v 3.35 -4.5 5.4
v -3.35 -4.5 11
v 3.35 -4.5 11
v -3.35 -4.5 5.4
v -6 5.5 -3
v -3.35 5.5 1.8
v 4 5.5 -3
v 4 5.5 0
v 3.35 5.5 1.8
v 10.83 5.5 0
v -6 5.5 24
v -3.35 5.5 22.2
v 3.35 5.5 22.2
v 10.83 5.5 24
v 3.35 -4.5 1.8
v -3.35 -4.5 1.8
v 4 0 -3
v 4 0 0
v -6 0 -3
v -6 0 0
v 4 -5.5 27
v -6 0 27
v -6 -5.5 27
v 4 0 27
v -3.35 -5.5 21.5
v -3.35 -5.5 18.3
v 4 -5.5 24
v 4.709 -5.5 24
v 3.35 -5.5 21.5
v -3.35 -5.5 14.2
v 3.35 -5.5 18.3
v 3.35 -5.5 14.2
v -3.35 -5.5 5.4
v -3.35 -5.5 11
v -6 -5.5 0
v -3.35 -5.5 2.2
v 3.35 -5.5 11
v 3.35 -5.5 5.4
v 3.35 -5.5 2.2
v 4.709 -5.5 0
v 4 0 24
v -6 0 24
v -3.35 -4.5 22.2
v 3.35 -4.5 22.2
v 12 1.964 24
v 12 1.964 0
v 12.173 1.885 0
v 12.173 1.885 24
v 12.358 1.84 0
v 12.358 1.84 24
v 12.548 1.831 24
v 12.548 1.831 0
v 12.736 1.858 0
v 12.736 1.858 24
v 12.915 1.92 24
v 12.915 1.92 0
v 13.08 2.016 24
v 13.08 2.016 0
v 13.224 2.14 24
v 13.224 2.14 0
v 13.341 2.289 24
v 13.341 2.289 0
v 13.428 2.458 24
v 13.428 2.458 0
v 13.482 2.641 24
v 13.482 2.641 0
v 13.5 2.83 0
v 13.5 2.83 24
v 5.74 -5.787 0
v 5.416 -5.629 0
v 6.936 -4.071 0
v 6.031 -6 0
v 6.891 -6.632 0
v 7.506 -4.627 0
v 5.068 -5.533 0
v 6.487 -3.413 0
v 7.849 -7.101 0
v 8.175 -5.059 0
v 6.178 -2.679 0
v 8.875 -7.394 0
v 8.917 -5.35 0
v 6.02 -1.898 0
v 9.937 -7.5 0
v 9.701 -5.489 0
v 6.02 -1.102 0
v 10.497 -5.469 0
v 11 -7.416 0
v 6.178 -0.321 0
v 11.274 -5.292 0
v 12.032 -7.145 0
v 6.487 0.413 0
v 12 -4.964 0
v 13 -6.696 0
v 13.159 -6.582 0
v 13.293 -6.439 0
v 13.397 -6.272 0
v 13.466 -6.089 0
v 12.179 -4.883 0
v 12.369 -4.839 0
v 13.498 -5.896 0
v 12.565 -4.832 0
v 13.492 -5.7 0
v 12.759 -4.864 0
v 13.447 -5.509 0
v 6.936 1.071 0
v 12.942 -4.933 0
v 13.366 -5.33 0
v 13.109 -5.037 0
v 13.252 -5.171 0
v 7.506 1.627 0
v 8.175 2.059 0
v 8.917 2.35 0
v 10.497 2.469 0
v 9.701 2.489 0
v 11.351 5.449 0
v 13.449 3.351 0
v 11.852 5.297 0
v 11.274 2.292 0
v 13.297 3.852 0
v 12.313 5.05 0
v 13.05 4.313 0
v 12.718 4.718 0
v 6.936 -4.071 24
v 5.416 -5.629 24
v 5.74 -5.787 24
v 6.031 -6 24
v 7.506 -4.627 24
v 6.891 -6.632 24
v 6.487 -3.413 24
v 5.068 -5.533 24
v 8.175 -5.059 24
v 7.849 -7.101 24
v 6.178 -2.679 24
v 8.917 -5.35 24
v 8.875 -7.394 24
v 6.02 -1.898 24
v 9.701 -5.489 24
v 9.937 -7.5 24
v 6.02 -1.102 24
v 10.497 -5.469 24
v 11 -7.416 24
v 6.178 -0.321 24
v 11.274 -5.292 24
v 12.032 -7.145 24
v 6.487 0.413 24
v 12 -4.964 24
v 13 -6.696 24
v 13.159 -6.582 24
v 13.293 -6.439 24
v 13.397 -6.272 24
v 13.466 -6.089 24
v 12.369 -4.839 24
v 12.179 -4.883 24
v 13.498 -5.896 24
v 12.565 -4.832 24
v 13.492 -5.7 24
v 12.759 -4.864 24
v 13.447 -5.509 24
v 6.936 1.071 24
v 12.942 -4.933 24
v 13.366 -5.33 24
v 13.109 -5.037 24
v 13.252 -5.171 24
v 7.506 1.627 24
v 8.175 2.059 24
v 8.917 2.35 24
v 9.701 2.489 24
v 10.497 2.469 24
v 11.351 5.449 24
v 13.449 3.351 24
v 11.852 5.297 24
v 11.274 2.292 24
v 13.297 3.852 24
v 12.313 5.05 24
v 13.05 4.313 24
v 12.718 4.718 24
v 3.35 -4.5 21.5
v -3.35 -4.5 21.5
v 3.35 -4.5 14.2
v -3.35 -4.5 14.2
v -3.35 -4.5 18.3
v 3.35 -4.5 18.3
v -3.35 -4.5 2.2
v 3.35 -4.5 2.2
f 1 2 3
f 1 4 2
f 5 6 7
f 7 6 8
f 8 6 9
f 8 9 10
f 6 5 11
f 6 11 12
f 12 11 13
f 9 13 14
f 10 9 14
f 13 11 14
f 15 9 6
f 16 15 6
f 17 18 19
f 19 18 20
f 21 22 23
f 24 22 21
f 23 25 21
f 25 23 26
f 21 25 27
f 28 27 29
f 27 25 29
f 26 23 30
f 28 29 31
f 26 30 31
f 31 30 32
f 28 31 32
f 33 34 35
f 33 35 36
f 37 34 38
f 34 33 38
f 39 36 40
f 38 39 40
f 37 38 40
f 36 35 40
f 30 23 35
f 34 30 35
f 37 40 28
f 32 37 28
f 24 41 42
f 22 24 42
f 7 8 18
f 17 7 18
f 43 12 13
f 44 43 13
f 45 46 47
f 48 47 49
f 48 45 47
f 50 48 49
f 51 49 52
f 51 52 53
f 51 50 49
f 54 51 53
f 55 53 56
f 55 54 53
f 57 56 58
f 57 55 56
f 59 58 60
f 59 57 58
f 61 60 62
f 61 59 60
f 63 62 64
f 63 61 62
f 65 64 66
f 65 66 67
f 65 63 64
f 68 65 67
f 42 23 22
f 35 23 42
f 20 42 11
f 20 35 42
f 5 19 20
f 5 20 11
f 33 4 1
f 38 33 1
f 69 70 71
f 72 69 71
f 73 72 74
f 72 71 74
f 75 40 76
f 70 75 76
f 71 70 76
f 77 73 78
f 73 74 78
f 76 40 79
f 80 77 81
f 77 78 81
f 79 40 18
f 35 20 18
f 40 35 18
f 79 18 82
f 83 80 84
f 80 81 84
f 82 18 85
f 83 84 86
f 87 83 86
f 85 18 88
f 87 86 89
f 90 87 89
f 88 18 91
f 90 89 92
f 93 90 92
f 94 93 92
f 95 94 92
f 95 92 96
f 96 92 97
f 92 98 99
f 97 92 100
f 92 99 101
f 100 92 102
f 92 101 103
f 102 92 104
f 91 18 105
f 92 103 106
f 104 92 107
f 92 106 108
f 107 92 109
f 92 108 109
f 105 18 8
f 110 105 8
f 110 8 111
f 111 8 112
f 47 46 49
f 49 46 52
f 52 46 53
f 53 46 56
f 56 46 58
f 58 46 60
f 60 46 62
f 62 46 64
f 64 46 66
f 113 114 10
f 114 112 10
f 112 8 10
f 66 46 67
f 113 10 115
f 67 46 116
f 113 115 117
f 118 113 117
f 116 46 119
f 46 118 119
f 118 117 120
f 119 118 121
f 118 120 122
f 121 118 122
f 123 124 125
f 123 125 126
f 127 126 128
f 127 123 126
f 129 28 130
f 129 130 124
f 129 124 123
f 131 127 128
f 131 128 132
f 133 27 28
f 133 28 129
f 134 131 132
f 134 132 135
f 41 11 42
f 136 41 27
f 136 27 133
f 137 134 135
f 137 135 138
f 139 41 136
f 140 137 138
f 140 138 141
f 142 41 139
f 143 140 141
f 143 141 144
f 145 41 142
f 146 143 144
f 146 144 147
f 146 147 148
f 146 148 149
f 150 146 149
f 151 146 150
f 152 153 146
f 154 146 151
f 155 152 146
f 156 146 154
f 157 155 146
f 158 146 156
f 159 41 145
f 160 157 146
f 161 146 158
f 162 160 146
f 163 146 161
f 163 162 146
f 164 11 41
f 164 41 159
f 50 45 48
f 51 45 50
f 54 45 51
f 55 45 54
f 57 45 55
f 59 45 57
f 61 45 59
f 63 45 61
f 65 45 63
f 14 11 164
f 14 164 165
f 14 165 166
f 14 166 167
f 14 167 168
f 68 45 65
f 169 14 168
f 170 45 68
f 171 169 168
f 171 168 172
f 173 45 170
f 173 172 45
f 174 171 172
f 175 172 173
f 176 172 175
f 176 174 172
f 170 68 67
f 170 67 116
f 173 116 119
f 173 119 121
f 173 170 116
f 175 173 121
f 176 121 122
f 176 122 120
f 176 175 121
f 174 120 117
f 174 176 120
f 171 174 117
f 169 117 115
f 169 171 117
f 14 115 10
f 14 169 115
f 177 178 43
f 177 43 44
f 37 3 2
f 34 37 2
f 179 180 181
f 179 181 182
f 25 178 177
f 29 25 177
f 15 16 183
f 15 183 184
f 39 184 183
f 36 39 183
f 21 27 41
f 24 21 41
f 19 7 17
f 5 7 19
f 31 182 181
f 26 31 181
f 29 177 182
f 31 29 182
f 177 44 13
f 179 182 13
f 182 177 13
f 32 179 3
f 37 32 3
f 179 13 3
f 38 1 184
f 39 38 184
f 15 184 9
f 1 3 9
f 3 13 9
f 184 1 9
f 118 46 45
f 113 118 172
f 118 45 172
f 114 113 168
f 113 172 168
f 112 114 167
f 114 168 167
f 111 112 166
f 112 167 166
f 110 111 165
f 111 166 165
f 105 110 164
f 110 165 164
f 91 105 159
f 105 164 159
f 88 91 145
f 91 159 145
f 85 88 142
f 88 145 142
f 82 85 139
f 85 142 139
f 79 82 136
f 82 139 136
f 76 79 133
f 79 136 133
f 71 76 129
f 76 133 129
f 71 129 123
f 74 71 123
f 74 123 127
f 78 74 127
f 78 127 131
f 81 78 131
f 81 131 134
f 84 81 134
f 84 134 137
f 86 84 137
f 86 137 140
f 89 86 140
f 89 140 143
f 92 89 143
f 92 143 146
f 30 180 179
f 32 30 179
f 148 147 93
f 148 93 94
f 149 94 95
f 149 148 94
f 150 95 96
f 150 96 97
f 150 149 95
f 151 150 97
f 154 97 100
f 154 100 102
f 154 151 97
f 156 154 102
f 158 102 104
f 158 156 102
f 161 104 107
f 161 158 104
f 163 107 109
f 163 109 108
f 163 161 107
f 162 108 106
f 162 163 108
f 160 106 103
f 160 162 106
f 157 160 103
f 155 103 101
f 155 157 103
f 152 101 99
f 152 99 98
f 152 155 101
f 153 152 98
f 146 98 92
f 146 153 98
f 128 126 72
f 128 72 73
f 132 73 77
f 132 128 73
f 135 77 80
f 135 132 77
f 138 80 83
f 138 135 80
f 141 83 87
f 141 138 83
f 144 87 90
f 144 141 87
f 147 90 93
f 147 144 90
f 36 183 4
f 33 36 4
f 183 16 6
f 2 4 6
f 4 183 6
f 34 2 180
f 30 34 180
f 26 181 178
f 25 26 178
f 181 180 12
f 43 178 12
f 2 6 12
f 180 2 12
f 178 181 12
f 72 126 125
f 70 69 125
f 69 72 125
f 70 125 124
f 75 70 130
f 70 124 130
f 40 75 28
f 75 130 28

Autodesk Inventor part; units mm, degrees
ref_plane "YZ Plane" through (0, 0, 0) normal (1, 0, 0) x (0, 1, 0)
ref_plane "XZ Plane" through (0, 0, 0) normal (0, 1, 0) x (-1, 0, 0)
ref_plane "XY Plane" through (0, 0, 0) normal (0, 0, 1) x (1, 0, 0)
sketch "Sketch1" plane through (0, 0, 0) normal (0, 0, 1) x (1, 0, 0)
  line L0 (-6, 5.5) -> (6, 5.5)
  line L1 (6, 5.5) -> (6, -5.5)
  line L2 (6, -5.5) -> (-6, -5.5)
  line L3 (-6, -5.5) -> (-6, 5.5)
  point P0 (0, 0)
  point P1 (6, 0)
  point P2 (0, 5.5)
  dimension "d0" = 12
  dimension "d1" = 11
extrude "Extrusion1" add sketch "Sketch1" along normal blind 24
sketch "Sketch2" plane through (-6, 5.5, 0) normal (0, 1, 0) x (1, 0, 0)
  line L0 (2.65, -22.2) -> (9.35, -22.2)
  line L1 (9.35, -22.2) -> (9.35, -1.8)
  line L2 (9.35, -1.8) -> (2.65, -1.8)
  line L3 (2.65, -1.8) -> (2.65, -22.2)
  line L4 (0, 0) -> (0, -24) projected
  line L5 (0, 0) -> (12, 0) projected
  point P0 (6, 0)
  point P1 (2.65, -12)
  point P2 (0, -12)
  point P3 (6, -1.8)
  point P4 (6, 0)
  dimension "d4" = 20.4
  dimension "d5" = 6.7
extrude "Extrusion2" cut sketch "Sketch2" against normal blind 10
sketch "Sketch3" plane through (-6, -4.5, 0) normal (0, 1, 0) x (1, 0, 0)
  line L0 (2.65, -22.2) -> (2.65, -1.8) projected
  line L1 (9.35, -1.8) -> (9.35, -22.2) projected
  line L2 (2.65, -21.5) -> (9.35, -21.5)
  line L3 (9.35, -21.5) -> (9.35, -18.3)
  line L4 (9.35, -18.3) -> (2.65, -18.3)
  line L5 (2.65, -18.3) -> (2.65, -21.5)
  line L6 (2.65, -14.2) -> (9.35, -14.2)
  line L7 (9.35, -14.2) -> (9.35, -11)
  line L8 (9.35, -11) -> (2.65, -11)
  line L9 (2.65, -11) -> (2.65, -14.2)
  line L10 (2.65, -5.4) -> (9.35, -5.4)
  line L11 (9.35, -5.4) -> (9.35, -2.2)
  line L12 (9.35, -2.2) -> (2.65, -2.2)
  line L13 (2.65, -2.2) -> (2.65, -5.4)
  line L14 (9.35, -22.2) -> (2.65, -22.2) projected
  line L15 (2.65, -1.8) -> (9.35, -1.8) projected
  point P0 (6, 0)
  point P1 (2.65, -19.9)
  point P2 (2.65, -12.6)
  point P3 (2.65, -3.8)
  dimension "d9" = 7.3
  dimension "d10" = 8.8
  dimension "d11" = 3.2
  dimension "d12" = 3.2
  dimension "d13" = 3.2
  dimension "d39" = 2
extrude "Extrusion3" cut sketch "Sketch3" against normal blind 10 contours L0 L4 L1 L2 | L0 L8 L1 L6 | L0 L12 L1 L10
sketch "Sketch4" plane through (0, 0, 24) normal (0, 0, 1) x (1, 0, 0)
  line L0 (6, 5.5) -> (-6, 5.5) projected
  circle A0 centre (10, -1.5) radius 4
  arc A1 (6, 2.9721) -> (13, -6.6962) centre (10, -1.5) ccw
  arc A2 (12, 1.9641) -> (13.5, 2.8301) centre (12.5, 2.8301) ccw
  arc A3 (13, -6.6962) -> (12, -4.9641) centre (12.5, -5.8301) ccw
  line L1 (6, -5.5) -> (6, 5.5) projected
  line L2 (6, 2.9721) -> (6, -5.9721)
  circle A4 centre (10, -1.5) radius 4
  arc A5 (6, 2.9721) -> (13, -6.6962) centre (10, -1.5) ccw
  line L3 (6, 5.5) -> (10.8301, 5.5)
  line L4 (6, 5.5) -> (6, 2.9721)
  arc A6 (13.5, 2.8301) -> (10.8301, 5.5) centre (10.8301, 2.8301) ccw
  point P0 (0, 0)
  dimension "d31" = 8
  dimension "d32" = 12
  dimension "d33" = 7
  dimension "d34" = 2.5
extrude "Extrusion4" add sketch "Sketch4" against normal blind 24 contours A0 L1 L3 A6 A2 | A3 A1 L2 L1 A0 | L1 L2 A1
sketch "Sketch5" plane through (0, 0, 0) normal (0, 0, -1) x (-1, 0, 0)
  line L0 (6, 5.5) -> (-6, 5.5) projected
  line L1 (6, 5.5) -> (-4, 5.5)
  line L2 (-4, 5.5) -> (-4, 0)
  line L3 (-4, 0) -> (6, 0)
  line L4 (6, 0) -> (6, 5.5)
  dimension "d35" = 10
  dimension "d36" = 5.5
extrude "Extrusion5" add sketch "Sketch5" along normal blind 3
sketch "Sketch6" plane through (0, 0, 24) normal (0, 0, 1) x (1, 0, 0)
  line L0 (-6, -5.5) -> (-6, 0) projected
  line L1 (-6, -5.5) -> (4, -5.5)
  line L2 (4, -5.5) -> (4, 0)
  line L3 (4, 0) -> (-6, 0)
  line L4 (-6, 0) -> (-6, -5.5)
  dimension "d37" = 10
  dimension "d38" = 5.5
extrude "Extrusion6" add sketch "Sketch6" along normal blind 3
fillet "Fillet2" radius 2 1 edges at (5.5279, -5.5, 12)
properties part number "Switch holder_Right"
